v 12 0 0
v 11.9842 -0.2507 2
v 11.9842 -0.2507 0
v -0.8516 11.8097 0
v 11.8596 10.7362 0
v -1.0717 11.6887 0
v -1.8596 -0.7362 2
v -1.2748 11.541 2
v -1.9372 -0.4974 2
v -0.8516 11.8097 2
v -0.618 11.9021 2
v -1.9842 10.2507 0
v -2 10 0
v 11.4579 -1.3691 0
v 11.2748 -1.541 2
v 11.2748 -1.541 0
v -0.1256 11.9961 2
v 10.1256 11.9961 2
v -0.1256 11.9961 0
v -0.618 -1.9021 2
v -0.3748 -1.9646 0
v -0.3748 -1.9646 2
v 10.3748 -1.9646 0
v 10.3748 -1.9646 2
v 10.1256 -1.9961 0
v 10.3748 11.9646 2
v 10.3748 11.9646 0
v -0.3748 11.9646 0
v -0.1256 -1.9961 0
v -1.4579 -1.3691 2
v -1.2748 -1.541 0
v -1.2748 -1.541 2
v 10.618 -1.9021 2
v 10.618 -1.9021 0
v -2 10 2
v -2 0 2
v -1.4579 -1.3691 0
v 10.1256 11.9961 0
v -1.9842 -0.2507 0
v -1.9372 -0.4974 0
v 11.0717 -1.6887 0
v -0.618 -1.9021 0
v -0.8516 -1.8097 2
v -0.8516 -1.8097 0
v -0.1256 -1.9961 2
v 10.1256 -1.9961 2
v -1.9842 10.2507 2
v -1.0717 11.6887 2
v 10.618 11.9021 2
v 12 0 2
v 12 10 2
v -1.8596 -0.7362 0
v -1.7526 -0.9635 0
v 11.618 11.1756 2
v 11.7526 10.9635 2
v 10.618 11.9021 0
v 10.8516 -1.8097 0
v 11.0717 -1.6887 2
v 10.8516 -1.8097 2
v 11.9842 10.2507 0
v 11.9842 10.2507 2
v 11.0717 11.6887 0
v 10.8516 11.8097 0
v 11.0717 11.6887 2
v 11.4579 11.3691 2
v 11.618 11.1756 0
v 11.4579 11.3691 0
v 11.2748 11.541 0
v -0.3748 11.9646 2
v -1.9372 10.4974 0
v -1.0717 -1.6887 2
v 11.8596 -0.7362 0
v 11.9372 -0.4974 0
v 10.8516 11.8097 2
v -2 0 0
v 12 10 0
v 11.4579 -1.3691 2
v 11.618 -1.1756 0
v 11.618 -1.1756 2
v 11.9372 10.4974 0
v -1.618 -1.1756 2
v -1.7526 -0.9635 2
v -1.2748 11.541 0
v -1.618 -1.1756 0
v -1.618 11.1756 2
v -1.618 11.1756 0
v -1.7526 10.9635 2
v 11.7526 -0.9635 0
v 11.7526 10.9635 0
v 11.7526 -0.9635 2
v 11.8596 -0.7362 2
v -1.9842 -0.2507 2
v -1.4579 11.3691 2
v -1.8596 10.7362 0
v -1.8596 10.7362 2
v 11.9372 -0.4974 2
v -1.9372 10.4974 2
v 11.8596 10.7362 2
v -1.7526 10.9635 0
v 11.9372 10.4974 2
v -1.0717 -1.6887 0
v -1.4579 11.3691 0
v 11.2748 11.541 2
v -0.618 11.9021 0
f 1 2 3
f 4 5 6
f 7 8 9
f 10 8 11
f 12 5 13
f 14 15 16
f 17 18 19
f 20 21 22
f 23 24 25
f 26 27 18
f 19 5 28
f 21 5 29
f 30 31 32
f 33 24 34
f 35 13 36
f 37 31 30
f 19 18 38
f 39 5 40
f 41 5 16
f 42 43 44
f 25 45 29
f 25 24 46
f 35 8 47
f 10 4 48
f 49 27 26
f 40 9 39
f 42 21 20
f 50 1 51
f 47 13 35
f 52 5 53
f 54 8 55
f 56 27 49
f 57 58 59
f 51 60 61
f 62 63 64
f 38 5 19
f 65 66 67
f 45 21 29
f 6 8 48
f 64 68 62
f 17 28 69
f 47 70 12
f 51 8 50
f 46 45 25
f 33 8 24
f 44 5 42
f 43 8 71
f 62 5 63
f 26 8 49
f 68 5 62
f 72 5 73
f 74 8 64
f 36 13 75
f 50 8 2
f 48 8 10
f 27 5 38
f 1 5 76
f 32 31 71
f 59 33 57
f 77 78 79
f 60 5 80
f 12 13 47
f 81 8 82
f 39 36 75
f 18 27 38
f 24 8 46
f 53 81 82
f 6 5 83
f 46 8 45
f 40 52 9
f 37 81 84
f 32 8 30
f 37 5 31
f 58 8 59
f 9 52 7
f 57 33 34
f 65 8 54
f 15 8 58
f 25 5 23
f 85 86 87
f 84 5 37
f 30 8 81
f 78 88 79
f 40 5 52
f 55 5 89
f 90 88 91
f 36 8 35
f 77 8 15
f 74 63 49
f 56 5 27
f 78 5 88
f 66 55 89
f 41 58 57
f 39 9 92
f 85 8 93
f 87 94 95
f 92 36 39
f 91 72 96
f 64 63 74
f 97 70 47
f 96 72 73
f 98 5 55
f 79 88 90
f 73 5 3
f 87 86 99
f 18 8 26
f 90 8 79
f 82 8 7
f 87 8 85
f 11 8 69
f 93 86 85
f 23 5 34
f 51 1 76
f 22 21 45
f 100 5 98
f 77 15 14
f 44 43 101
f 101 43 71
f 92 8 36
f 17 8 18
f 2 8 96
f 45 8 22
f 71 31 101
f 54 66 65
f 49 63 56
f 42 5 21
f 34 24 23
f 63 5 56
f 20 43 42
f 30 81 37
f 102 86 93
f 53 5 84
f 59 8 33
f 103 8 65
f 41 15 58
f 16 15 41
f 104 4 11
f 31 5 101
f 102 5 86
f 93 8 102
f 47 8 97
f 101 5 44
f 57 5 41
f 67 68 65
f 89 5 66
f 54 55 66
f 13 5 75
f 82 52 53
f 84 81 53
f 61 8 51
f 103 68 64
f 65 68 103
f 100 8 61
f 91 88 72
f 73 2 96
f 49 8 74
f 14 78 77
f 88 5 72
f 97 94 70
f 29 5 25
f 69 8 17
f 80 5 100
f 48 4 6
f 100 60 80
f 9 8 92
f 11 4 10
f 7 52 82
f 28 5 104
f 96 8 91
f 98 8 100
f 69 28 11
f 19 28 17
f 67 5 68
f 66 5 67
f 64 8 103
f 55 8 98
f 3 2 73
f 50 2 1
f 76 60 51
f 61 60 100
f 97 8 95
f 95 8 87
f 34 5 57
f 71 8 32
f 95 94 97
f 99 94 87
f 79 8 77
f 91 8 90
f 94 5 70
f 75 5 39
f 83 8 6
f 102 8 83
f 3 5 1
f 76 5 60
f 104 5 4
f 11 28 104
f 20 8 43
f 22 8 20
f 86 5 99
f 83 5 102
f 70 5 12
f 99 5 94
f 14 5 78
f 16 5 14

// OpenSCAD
$fn=50;
minkowski()
{
 cube([10,10,1]);
 cylinder(r=2,h=1);
}

hull() {
   translate([15,10,0]) circle(10);
   circle(2);
}
